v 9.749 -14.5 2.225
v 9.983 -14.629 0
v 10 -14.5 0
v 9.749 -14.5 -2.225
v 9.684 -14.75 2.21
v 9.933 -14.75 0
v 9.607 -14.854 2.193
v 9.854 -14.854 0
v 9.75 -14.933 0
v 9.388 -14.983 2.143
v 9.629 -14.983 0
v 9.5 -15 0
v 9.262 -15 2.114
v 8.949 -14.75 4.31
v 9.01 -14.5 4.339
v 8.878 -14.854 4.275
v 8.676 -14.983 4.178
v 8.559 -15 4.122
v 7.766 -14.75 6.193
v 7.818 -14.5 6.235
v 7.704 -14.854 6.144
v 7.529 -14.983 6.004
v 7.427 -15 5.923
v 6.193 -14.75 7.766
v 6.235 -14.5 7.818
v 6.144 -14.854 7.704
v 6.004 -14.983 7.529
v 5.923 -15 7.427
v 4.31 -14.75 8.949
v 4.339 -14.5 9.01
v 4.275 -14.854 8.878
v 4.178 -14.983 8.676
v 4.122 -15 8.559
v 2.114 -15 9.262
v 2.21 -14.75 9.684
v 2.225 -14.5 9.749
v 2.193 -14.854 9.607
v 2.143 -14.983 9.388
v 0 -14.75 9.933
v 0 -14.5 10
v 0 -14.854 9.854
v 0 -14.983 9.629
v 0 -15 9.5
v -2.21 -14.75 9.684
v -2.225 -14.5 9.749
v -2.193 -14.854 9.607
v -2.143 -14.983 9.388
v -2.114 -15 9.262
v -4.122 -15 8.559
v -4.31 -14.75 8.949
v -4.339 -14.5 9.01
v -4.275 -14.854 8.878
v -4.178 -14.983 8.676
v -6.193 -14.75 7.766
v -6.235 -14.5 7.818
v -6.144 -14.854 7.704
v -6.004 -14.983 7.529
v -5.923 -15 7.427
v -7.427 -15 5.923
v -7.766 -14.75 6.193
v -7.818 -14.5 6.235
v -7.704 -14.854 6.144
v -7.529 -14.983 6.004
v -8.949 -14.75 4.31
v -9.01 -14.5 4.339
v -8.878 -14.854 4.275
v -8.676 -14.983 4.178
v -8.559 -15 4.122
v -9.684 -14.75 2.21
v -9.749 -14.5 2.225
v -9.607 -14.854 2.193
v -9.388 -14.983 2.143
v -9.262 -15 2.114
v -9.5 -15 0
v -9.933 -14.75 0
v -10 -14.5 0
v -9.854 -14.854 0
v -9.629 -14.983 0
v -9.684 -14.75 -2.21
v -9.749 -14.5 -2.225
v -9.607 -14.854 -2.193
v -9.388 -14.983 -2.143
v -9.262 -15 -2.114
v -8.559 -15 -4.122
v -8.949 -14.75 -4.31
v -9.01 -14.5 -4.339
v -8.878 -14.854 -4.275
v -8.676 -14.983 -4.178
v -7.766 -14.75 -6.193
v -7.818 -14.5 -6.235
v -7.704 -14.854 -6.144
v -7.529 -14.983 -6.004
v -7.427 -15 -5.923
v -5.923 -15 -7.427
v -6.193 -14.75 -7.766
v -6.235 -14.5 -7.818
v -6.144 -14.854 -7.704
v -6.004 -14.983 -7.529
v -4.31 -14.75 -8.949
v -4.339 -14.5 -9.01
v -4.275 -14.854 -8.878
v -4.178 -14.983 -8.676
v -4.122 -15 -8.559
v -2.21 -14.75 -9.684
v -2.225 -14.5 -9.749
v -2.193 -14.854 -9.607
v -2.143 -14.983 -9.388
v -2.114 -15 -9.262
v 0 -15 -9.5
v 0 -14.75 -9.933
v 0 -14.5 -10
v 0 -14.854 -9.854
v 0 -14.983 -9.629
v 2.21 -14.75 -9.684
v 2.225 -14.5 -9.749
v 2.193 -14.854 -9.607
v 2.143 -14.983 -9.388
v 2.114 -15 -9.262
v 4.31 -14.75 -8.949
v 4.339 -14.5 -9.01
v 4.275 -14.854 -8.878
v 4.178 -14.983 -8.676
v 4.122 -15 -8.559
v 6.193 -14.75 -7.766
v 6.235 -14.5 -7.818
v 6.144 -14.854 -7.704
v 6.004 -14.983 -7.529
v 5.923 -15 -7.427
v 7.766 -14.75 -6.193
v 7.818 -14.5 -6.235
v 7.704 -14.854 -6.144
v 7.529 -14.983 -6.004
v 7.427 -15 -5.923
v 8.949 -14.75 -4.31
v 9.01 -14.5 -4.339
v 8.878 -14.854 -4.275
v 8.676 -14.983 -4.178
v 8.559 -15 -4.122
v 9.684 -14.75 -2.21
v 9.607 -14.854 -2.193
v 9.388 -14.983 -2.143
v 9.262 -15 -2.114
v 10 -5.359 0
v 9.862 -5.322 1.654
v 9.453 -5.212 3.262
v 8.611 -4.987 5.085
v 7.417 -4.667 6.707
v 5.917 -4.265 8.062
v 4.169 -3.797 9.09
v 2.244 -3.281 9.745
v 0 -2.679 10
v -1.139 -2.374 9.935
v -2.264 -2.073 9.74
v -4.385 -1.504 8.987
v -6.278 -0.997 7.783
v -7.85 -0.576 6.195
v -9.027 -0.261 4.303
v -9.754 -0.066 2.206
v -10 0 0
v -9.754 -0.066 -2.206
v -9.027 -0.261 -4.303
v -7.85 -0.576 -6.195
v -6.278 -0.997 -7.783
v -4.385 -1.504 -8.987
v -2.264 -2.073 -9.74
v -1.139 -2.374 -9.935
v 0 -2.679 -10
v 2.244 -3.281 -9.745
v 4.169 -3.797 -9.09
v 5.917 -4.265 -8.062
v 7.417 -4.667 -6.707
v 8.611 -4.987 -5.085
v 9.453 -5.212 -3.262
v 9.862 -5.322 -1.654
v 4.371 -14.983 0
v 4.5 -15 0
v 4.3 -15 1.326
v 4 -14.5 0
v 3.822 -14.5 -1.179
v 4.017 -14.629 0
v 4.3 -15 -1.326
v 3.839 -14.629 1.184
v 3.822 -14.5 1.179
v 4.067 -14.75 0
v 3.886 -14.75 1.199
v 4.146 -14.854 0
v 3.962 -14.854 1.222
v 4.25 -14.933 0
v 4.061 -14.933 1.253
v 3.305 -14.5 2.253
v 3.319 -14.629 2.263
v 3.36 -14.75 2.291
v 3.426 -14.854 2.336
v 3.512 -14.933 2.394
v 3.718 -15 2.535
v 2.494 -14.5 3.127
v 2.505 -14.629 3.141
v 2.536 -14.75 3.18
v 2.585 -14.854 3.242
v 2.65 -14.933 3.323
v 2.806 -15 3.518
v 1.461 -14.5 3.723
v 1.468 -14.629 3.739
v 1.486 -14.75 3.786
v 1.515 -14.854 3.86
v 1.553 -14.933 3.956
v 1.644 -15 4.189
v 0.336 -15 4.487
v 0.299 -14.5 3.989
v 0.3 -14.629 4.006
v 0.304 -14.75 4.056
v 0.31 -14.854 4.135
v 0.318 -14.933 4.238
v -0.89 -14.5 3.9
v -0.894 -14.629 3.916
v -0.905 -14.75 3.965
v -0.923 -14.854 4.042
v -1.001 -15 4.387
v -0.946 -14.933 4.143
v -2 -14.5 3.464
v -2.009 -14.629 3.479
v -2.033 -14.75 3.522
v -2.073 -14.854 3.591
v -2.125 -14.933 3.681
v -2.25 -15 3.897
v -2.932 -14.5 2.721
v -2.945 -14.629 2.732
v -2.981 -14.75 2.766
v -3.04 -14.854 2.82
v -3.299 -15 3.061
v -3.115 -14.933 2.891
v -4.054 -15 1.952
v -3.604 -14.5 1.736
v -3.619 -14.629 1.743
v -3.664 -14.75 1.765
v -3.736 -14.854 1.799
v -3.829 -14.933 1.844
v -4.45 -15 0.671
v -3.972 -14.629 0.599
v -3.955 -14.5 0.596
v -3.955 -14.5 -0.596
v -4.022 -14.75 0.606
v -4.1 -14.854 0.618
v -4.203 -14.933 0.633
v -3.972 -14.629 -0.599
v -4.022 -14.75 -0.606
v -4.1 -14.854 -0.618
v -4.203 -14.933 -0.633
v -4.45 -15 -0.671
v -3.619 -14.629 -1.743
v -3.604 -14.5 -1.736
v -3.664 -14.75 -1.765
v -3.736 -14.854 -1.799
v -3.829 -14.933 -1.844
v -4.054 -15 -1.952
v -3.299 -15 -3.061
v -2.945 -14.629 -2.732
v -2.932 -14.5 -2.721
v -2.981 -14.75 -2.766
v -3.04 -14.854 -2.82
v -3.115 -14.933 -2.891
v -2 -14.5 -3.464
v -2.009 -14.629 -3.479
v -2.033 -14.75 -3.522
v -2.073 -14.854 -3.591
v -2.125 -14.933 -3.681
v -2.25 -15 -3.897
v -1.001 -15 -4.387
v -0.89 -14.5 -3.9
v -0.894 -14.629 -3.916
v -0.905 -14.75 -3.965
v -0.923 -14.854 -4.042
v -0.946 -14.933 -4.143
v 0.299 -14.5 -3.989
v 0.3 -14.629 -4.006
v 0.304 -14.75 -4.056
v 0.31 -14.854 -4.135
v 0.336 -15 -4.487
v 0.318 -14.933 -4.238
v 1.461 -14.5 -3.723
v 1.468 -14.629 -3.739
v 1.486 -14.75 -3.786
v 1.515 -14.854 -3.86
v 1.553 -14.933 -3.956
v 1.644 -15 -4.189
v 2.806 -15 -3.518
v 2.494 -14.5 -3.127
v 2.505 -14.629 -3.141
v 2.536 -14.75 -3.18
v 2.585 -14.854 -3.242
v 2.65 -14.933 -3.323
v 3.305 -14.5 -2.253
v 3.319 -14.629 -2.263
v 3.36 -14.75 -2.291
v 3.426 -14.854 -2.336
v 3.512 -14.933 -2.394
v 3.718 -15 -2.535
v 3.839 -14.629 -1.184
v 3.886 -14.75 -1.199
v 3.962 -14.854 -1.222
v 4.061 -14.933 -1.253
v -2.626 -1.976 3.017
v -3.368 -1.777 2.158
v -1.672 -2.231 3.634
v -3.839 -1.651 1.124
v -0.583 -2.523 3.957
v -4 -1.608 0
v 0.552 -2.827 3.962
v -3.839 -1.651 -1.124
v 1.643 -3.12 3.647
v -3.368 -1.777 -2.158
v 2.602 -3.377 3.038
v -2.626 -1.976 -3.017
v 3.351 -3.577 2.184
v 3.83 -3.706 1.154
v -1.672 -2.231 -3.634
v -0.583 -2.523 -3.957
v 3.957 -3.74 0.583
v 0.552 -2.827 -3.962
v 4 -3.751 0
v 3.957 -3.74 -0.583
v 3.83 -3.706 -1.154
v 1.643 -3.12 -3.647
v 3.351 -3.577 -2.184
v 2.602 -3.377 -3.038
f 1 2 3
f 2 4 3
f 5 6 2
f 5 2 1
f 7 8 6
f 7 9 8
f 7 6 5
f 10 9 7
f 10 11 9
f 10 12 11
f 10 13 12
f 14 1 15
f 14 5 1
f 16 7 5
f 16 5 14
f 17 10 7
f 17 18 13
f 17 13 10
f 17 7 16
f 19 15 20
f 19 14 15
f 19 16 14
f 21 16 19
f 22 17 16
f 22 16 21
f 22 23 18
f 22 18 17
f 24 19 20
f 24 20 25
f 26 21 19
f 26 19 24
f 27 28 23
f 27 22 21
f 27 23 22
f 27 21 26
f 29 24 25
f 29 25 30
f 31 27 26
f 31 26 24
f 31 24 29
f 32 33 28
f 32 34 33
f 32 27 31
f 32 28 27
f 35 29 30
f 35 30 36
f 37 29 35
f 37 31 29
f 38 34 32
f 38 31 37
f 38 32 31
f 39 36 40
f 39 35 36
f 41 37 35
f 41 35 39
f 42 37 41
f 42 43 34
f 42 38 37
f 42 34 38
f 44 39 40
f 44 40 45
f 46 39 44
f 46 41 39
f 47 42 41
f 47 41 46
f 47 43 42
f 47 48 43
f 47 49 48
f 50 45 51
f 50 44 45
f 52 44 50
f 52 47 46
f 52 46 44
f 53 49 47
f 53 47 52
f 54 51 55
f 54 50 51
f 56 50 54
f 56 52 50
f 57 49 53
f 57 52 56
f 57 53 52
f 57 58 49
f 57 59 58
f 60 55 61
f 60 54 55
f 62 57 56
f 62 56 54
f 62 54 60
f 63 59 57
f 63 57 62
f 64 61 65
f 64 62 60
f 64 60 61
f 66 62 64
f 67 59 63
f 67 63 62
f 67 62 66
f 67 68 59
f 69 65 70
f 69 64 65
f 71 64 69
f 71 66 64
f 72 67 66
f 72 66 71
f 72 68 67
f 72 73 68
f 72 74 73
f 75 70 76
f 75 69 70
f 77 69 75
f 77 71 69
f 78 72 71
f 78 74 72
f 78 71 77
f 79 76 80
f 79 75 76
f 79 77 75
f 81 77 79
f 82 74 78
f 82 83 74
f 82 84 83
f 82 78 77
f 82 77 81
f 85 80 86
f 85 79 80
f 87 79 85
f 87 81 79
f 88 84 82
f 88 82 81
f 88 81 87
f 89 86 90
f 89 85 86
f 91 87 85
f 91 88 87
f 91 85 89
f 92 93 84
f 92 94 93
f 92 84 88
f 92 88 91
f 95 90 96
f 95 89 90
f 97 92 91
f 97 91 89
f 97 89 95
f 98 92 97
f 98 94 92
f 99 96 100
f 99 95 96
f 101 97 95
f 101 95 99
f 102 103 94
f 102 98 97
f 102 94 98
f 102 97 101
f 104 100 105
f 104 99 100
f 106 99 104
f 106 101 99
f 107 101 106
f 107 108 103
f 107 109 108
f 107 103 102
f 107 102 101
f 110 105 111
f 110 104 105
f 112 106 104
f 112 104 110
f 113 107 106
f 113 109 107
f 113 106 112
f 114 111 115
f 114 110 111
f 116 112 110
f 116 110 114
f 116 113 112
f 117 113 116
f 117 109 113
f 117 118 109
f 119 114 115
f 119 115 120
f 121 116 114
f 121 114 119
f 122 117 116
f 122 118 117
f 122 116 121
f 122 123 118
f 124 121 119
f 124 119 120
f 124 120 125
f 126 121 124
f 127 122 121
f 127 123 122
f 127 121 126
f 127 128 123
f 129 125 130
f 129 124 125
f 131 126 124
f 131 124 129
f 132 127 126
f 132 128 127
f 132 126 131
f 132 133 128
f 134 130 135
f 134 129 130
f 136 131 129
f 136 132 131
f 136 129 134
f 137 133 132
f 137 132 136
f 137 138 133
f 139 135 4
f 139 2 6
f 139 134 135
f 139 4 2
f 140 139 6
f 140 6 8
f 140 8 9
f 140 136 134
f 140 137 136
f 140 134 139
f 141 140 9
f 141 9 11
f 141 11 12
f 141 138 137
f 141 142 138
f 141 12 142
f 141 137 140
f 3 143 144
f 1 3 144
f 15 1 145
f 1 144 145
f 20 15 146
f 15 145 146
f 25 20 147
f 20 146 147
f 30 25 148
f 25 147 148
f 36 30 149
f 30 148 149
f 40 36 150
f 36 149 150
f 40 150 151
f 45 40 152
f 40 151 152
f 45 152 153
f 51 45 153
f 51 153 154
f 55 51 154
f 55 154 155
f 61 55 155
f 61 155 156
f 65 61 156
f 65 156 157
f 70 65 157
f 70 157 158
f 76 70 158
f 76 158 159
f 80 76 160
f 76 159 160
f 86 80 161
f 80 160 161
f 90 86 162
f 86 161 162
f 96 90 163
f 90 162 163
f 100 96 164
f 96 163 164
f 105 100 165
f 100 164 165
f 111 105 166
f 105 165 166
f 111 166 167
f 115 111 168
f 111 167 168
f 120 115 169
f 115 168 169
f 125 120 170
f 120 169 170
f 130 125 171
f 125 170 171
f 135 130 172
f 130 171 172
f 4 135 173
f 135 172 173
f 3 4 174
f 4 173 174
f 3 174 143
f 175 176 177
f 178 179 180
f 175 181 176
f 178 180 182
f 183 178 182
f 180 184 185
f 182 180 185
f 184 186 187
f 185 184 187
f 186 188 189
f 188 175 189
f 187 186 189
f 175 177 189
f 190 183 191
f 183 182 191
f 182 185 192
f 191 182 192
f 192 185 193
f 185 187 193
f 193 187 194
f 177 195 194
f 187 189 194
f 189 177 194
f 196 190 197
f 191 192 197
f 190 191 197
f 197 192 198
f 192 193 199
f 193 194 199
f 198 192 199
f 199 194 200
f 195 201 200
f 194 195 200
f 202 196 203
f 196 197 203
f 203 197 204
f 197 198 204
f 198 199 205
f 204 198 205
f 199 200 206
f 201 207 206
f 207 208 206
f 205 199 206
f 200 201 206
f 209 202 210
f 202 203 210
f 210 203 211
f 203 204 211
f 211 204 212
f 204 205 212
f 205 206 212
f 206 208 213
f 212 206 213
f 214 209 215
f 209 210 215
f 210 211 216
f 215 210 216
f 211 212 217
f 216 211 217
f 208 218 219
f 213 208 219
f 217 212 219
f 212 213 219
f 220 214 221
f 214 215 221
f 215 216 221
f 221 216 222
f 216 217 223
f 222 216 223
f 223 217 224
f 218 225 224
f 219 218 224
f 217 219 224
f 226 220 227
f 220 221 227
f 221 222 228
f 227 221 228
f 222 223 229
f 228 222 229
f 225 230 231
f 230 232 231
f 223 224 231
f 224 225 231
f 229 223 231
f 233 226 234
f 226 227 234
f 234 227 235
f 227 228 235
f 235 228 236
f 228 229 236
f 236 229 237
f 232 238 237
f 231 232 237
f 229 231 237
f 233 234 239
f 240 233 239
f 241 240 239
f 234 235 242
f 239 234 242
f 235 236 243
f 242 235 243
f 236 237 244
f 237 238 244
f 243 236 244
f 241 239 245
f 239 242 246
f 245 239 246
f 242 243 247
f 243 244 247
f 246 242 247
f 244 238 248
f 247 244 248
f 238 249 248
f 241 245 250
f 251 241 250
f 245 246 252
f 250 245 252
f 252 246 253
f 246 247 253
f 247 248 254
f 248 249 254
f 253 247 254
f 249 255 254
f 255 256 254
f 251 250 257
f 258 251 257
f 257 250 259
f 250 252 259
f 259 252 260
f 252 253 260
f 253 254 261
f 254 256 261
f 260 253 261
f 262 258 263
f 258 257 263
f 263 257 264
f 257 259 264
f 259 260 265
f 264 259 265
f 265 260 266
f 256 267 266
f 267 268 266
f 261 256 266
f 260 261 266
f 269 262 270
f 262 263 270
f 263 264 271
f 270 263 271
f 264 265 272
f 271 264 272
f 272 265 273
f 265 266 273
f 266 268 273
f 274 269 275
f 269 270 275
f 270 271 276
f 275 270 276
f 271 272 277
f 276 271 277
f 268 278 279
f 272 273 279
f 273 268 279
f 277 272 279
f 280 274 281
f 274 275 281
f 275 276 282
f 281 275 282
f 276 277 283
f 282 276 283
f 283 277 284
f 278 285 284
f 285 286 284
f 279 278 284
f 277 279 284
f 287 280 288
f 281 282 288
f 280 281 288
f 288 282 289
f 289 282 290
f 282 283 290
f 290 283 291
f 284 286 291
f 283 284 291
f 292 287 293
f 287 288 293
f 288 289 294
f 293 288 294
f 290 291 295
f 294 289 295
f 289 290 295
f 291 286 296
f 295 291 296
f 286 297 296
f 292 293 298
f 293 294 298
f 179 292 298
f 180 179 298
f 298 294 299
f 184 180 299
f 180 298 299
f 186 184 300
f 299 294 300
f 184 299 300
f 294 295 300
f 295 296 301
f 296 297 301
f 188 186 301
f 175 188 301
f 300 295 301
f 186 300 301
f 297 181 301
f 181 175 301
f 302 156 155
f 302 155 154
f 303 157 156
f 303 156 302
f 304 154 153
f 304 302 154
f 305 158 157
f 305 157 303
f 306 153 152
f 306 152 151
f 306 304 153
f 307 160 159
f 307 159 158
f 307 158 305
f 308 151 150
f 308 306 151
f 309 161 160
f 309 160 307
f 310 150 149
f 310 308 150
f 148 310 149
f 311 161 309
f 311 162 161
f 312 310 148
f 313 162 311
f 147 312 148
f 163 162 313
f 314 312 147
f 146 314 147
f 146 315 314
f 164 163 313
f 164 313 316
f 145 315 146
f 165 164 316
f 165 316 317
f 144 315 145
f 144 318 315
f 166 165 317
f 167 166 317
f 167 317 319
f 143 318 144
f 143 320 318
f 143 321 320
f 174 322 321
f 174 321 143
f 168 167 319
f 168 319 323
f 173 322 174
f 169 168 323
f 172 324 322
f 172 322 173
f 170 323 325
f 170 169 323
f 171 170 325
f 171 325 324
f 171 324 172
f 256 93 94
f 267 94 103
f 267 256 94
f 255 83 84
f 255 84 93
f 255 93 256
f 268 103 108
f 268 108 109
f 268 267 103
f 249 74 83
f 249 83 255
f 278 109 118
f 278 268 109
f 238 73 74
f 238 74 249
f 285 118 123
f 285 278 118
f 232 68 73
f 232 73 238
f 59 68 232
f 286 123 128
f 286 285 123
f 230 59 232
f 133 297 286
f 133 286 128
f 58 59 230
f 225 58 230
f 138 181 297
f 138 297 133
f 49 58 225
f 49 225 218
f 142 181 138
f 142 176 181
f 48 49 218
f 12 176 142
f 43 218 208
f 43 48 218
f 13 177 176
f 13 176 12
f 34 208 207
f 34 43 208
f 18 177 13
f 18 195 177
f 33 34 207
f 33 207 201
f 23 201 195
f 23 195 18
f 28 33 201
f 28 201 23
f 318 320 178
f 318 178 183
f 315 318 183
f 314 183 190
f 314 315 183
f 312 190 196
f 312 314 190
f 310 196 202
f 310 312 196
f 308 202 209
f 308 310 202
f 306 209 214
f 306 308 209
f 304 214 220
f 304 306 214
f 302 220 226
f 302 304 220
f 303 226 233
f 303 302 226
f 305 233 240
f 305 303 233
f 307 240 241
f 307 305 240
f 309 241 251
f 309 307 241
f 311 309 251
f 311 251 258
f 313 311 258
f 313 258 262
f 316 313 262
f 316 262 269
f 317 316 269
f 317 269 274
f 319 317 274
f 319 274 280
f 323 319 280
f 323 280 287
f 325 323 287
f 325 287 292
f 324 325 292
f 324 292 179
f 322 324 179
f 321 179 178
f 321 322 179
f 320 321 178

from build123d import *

# Parameters (mm, degrees)
F0_R          = 10
F0_R_2        = 4
F1_DEPTH      = 15
F2_R          = 0.5
F4_DEPTH      = 10
F4_DEPTH_BACK = 10


with BuildPart() as f1:
    # F0 (on Front) → F1 (new body)
    with BuildSketch(Plane.XZ):
        Circle(F0_R)
        Circle(F0_R_2, mode=Mode.SUBTRACT)
    extrude(amount=F1_DEPTH)

    # F2
    f2_edges = [f1.edges().sort_by_distance(p)[0] for p in [
        (-10, -15, 0),
        (-4, -15, 0),
    ]]
    fillet(f2_edges, radius=F2_R)

    # F3 (on Top) → F4 (cut, two sides)
    with BuildSketch(Plane.XY) as f4_sk:
        Polygon((10, 0), (-10, 0), (10, -5.358984), align=None)
    extrude(amount=F4_DEPTH, mode=Mode.SUBTRACT)
    extrude(f4_sk.sketch, amount=-F4_DEPTH_BACK, mode=Mode.SUBTRACT)


solid = f1.part
